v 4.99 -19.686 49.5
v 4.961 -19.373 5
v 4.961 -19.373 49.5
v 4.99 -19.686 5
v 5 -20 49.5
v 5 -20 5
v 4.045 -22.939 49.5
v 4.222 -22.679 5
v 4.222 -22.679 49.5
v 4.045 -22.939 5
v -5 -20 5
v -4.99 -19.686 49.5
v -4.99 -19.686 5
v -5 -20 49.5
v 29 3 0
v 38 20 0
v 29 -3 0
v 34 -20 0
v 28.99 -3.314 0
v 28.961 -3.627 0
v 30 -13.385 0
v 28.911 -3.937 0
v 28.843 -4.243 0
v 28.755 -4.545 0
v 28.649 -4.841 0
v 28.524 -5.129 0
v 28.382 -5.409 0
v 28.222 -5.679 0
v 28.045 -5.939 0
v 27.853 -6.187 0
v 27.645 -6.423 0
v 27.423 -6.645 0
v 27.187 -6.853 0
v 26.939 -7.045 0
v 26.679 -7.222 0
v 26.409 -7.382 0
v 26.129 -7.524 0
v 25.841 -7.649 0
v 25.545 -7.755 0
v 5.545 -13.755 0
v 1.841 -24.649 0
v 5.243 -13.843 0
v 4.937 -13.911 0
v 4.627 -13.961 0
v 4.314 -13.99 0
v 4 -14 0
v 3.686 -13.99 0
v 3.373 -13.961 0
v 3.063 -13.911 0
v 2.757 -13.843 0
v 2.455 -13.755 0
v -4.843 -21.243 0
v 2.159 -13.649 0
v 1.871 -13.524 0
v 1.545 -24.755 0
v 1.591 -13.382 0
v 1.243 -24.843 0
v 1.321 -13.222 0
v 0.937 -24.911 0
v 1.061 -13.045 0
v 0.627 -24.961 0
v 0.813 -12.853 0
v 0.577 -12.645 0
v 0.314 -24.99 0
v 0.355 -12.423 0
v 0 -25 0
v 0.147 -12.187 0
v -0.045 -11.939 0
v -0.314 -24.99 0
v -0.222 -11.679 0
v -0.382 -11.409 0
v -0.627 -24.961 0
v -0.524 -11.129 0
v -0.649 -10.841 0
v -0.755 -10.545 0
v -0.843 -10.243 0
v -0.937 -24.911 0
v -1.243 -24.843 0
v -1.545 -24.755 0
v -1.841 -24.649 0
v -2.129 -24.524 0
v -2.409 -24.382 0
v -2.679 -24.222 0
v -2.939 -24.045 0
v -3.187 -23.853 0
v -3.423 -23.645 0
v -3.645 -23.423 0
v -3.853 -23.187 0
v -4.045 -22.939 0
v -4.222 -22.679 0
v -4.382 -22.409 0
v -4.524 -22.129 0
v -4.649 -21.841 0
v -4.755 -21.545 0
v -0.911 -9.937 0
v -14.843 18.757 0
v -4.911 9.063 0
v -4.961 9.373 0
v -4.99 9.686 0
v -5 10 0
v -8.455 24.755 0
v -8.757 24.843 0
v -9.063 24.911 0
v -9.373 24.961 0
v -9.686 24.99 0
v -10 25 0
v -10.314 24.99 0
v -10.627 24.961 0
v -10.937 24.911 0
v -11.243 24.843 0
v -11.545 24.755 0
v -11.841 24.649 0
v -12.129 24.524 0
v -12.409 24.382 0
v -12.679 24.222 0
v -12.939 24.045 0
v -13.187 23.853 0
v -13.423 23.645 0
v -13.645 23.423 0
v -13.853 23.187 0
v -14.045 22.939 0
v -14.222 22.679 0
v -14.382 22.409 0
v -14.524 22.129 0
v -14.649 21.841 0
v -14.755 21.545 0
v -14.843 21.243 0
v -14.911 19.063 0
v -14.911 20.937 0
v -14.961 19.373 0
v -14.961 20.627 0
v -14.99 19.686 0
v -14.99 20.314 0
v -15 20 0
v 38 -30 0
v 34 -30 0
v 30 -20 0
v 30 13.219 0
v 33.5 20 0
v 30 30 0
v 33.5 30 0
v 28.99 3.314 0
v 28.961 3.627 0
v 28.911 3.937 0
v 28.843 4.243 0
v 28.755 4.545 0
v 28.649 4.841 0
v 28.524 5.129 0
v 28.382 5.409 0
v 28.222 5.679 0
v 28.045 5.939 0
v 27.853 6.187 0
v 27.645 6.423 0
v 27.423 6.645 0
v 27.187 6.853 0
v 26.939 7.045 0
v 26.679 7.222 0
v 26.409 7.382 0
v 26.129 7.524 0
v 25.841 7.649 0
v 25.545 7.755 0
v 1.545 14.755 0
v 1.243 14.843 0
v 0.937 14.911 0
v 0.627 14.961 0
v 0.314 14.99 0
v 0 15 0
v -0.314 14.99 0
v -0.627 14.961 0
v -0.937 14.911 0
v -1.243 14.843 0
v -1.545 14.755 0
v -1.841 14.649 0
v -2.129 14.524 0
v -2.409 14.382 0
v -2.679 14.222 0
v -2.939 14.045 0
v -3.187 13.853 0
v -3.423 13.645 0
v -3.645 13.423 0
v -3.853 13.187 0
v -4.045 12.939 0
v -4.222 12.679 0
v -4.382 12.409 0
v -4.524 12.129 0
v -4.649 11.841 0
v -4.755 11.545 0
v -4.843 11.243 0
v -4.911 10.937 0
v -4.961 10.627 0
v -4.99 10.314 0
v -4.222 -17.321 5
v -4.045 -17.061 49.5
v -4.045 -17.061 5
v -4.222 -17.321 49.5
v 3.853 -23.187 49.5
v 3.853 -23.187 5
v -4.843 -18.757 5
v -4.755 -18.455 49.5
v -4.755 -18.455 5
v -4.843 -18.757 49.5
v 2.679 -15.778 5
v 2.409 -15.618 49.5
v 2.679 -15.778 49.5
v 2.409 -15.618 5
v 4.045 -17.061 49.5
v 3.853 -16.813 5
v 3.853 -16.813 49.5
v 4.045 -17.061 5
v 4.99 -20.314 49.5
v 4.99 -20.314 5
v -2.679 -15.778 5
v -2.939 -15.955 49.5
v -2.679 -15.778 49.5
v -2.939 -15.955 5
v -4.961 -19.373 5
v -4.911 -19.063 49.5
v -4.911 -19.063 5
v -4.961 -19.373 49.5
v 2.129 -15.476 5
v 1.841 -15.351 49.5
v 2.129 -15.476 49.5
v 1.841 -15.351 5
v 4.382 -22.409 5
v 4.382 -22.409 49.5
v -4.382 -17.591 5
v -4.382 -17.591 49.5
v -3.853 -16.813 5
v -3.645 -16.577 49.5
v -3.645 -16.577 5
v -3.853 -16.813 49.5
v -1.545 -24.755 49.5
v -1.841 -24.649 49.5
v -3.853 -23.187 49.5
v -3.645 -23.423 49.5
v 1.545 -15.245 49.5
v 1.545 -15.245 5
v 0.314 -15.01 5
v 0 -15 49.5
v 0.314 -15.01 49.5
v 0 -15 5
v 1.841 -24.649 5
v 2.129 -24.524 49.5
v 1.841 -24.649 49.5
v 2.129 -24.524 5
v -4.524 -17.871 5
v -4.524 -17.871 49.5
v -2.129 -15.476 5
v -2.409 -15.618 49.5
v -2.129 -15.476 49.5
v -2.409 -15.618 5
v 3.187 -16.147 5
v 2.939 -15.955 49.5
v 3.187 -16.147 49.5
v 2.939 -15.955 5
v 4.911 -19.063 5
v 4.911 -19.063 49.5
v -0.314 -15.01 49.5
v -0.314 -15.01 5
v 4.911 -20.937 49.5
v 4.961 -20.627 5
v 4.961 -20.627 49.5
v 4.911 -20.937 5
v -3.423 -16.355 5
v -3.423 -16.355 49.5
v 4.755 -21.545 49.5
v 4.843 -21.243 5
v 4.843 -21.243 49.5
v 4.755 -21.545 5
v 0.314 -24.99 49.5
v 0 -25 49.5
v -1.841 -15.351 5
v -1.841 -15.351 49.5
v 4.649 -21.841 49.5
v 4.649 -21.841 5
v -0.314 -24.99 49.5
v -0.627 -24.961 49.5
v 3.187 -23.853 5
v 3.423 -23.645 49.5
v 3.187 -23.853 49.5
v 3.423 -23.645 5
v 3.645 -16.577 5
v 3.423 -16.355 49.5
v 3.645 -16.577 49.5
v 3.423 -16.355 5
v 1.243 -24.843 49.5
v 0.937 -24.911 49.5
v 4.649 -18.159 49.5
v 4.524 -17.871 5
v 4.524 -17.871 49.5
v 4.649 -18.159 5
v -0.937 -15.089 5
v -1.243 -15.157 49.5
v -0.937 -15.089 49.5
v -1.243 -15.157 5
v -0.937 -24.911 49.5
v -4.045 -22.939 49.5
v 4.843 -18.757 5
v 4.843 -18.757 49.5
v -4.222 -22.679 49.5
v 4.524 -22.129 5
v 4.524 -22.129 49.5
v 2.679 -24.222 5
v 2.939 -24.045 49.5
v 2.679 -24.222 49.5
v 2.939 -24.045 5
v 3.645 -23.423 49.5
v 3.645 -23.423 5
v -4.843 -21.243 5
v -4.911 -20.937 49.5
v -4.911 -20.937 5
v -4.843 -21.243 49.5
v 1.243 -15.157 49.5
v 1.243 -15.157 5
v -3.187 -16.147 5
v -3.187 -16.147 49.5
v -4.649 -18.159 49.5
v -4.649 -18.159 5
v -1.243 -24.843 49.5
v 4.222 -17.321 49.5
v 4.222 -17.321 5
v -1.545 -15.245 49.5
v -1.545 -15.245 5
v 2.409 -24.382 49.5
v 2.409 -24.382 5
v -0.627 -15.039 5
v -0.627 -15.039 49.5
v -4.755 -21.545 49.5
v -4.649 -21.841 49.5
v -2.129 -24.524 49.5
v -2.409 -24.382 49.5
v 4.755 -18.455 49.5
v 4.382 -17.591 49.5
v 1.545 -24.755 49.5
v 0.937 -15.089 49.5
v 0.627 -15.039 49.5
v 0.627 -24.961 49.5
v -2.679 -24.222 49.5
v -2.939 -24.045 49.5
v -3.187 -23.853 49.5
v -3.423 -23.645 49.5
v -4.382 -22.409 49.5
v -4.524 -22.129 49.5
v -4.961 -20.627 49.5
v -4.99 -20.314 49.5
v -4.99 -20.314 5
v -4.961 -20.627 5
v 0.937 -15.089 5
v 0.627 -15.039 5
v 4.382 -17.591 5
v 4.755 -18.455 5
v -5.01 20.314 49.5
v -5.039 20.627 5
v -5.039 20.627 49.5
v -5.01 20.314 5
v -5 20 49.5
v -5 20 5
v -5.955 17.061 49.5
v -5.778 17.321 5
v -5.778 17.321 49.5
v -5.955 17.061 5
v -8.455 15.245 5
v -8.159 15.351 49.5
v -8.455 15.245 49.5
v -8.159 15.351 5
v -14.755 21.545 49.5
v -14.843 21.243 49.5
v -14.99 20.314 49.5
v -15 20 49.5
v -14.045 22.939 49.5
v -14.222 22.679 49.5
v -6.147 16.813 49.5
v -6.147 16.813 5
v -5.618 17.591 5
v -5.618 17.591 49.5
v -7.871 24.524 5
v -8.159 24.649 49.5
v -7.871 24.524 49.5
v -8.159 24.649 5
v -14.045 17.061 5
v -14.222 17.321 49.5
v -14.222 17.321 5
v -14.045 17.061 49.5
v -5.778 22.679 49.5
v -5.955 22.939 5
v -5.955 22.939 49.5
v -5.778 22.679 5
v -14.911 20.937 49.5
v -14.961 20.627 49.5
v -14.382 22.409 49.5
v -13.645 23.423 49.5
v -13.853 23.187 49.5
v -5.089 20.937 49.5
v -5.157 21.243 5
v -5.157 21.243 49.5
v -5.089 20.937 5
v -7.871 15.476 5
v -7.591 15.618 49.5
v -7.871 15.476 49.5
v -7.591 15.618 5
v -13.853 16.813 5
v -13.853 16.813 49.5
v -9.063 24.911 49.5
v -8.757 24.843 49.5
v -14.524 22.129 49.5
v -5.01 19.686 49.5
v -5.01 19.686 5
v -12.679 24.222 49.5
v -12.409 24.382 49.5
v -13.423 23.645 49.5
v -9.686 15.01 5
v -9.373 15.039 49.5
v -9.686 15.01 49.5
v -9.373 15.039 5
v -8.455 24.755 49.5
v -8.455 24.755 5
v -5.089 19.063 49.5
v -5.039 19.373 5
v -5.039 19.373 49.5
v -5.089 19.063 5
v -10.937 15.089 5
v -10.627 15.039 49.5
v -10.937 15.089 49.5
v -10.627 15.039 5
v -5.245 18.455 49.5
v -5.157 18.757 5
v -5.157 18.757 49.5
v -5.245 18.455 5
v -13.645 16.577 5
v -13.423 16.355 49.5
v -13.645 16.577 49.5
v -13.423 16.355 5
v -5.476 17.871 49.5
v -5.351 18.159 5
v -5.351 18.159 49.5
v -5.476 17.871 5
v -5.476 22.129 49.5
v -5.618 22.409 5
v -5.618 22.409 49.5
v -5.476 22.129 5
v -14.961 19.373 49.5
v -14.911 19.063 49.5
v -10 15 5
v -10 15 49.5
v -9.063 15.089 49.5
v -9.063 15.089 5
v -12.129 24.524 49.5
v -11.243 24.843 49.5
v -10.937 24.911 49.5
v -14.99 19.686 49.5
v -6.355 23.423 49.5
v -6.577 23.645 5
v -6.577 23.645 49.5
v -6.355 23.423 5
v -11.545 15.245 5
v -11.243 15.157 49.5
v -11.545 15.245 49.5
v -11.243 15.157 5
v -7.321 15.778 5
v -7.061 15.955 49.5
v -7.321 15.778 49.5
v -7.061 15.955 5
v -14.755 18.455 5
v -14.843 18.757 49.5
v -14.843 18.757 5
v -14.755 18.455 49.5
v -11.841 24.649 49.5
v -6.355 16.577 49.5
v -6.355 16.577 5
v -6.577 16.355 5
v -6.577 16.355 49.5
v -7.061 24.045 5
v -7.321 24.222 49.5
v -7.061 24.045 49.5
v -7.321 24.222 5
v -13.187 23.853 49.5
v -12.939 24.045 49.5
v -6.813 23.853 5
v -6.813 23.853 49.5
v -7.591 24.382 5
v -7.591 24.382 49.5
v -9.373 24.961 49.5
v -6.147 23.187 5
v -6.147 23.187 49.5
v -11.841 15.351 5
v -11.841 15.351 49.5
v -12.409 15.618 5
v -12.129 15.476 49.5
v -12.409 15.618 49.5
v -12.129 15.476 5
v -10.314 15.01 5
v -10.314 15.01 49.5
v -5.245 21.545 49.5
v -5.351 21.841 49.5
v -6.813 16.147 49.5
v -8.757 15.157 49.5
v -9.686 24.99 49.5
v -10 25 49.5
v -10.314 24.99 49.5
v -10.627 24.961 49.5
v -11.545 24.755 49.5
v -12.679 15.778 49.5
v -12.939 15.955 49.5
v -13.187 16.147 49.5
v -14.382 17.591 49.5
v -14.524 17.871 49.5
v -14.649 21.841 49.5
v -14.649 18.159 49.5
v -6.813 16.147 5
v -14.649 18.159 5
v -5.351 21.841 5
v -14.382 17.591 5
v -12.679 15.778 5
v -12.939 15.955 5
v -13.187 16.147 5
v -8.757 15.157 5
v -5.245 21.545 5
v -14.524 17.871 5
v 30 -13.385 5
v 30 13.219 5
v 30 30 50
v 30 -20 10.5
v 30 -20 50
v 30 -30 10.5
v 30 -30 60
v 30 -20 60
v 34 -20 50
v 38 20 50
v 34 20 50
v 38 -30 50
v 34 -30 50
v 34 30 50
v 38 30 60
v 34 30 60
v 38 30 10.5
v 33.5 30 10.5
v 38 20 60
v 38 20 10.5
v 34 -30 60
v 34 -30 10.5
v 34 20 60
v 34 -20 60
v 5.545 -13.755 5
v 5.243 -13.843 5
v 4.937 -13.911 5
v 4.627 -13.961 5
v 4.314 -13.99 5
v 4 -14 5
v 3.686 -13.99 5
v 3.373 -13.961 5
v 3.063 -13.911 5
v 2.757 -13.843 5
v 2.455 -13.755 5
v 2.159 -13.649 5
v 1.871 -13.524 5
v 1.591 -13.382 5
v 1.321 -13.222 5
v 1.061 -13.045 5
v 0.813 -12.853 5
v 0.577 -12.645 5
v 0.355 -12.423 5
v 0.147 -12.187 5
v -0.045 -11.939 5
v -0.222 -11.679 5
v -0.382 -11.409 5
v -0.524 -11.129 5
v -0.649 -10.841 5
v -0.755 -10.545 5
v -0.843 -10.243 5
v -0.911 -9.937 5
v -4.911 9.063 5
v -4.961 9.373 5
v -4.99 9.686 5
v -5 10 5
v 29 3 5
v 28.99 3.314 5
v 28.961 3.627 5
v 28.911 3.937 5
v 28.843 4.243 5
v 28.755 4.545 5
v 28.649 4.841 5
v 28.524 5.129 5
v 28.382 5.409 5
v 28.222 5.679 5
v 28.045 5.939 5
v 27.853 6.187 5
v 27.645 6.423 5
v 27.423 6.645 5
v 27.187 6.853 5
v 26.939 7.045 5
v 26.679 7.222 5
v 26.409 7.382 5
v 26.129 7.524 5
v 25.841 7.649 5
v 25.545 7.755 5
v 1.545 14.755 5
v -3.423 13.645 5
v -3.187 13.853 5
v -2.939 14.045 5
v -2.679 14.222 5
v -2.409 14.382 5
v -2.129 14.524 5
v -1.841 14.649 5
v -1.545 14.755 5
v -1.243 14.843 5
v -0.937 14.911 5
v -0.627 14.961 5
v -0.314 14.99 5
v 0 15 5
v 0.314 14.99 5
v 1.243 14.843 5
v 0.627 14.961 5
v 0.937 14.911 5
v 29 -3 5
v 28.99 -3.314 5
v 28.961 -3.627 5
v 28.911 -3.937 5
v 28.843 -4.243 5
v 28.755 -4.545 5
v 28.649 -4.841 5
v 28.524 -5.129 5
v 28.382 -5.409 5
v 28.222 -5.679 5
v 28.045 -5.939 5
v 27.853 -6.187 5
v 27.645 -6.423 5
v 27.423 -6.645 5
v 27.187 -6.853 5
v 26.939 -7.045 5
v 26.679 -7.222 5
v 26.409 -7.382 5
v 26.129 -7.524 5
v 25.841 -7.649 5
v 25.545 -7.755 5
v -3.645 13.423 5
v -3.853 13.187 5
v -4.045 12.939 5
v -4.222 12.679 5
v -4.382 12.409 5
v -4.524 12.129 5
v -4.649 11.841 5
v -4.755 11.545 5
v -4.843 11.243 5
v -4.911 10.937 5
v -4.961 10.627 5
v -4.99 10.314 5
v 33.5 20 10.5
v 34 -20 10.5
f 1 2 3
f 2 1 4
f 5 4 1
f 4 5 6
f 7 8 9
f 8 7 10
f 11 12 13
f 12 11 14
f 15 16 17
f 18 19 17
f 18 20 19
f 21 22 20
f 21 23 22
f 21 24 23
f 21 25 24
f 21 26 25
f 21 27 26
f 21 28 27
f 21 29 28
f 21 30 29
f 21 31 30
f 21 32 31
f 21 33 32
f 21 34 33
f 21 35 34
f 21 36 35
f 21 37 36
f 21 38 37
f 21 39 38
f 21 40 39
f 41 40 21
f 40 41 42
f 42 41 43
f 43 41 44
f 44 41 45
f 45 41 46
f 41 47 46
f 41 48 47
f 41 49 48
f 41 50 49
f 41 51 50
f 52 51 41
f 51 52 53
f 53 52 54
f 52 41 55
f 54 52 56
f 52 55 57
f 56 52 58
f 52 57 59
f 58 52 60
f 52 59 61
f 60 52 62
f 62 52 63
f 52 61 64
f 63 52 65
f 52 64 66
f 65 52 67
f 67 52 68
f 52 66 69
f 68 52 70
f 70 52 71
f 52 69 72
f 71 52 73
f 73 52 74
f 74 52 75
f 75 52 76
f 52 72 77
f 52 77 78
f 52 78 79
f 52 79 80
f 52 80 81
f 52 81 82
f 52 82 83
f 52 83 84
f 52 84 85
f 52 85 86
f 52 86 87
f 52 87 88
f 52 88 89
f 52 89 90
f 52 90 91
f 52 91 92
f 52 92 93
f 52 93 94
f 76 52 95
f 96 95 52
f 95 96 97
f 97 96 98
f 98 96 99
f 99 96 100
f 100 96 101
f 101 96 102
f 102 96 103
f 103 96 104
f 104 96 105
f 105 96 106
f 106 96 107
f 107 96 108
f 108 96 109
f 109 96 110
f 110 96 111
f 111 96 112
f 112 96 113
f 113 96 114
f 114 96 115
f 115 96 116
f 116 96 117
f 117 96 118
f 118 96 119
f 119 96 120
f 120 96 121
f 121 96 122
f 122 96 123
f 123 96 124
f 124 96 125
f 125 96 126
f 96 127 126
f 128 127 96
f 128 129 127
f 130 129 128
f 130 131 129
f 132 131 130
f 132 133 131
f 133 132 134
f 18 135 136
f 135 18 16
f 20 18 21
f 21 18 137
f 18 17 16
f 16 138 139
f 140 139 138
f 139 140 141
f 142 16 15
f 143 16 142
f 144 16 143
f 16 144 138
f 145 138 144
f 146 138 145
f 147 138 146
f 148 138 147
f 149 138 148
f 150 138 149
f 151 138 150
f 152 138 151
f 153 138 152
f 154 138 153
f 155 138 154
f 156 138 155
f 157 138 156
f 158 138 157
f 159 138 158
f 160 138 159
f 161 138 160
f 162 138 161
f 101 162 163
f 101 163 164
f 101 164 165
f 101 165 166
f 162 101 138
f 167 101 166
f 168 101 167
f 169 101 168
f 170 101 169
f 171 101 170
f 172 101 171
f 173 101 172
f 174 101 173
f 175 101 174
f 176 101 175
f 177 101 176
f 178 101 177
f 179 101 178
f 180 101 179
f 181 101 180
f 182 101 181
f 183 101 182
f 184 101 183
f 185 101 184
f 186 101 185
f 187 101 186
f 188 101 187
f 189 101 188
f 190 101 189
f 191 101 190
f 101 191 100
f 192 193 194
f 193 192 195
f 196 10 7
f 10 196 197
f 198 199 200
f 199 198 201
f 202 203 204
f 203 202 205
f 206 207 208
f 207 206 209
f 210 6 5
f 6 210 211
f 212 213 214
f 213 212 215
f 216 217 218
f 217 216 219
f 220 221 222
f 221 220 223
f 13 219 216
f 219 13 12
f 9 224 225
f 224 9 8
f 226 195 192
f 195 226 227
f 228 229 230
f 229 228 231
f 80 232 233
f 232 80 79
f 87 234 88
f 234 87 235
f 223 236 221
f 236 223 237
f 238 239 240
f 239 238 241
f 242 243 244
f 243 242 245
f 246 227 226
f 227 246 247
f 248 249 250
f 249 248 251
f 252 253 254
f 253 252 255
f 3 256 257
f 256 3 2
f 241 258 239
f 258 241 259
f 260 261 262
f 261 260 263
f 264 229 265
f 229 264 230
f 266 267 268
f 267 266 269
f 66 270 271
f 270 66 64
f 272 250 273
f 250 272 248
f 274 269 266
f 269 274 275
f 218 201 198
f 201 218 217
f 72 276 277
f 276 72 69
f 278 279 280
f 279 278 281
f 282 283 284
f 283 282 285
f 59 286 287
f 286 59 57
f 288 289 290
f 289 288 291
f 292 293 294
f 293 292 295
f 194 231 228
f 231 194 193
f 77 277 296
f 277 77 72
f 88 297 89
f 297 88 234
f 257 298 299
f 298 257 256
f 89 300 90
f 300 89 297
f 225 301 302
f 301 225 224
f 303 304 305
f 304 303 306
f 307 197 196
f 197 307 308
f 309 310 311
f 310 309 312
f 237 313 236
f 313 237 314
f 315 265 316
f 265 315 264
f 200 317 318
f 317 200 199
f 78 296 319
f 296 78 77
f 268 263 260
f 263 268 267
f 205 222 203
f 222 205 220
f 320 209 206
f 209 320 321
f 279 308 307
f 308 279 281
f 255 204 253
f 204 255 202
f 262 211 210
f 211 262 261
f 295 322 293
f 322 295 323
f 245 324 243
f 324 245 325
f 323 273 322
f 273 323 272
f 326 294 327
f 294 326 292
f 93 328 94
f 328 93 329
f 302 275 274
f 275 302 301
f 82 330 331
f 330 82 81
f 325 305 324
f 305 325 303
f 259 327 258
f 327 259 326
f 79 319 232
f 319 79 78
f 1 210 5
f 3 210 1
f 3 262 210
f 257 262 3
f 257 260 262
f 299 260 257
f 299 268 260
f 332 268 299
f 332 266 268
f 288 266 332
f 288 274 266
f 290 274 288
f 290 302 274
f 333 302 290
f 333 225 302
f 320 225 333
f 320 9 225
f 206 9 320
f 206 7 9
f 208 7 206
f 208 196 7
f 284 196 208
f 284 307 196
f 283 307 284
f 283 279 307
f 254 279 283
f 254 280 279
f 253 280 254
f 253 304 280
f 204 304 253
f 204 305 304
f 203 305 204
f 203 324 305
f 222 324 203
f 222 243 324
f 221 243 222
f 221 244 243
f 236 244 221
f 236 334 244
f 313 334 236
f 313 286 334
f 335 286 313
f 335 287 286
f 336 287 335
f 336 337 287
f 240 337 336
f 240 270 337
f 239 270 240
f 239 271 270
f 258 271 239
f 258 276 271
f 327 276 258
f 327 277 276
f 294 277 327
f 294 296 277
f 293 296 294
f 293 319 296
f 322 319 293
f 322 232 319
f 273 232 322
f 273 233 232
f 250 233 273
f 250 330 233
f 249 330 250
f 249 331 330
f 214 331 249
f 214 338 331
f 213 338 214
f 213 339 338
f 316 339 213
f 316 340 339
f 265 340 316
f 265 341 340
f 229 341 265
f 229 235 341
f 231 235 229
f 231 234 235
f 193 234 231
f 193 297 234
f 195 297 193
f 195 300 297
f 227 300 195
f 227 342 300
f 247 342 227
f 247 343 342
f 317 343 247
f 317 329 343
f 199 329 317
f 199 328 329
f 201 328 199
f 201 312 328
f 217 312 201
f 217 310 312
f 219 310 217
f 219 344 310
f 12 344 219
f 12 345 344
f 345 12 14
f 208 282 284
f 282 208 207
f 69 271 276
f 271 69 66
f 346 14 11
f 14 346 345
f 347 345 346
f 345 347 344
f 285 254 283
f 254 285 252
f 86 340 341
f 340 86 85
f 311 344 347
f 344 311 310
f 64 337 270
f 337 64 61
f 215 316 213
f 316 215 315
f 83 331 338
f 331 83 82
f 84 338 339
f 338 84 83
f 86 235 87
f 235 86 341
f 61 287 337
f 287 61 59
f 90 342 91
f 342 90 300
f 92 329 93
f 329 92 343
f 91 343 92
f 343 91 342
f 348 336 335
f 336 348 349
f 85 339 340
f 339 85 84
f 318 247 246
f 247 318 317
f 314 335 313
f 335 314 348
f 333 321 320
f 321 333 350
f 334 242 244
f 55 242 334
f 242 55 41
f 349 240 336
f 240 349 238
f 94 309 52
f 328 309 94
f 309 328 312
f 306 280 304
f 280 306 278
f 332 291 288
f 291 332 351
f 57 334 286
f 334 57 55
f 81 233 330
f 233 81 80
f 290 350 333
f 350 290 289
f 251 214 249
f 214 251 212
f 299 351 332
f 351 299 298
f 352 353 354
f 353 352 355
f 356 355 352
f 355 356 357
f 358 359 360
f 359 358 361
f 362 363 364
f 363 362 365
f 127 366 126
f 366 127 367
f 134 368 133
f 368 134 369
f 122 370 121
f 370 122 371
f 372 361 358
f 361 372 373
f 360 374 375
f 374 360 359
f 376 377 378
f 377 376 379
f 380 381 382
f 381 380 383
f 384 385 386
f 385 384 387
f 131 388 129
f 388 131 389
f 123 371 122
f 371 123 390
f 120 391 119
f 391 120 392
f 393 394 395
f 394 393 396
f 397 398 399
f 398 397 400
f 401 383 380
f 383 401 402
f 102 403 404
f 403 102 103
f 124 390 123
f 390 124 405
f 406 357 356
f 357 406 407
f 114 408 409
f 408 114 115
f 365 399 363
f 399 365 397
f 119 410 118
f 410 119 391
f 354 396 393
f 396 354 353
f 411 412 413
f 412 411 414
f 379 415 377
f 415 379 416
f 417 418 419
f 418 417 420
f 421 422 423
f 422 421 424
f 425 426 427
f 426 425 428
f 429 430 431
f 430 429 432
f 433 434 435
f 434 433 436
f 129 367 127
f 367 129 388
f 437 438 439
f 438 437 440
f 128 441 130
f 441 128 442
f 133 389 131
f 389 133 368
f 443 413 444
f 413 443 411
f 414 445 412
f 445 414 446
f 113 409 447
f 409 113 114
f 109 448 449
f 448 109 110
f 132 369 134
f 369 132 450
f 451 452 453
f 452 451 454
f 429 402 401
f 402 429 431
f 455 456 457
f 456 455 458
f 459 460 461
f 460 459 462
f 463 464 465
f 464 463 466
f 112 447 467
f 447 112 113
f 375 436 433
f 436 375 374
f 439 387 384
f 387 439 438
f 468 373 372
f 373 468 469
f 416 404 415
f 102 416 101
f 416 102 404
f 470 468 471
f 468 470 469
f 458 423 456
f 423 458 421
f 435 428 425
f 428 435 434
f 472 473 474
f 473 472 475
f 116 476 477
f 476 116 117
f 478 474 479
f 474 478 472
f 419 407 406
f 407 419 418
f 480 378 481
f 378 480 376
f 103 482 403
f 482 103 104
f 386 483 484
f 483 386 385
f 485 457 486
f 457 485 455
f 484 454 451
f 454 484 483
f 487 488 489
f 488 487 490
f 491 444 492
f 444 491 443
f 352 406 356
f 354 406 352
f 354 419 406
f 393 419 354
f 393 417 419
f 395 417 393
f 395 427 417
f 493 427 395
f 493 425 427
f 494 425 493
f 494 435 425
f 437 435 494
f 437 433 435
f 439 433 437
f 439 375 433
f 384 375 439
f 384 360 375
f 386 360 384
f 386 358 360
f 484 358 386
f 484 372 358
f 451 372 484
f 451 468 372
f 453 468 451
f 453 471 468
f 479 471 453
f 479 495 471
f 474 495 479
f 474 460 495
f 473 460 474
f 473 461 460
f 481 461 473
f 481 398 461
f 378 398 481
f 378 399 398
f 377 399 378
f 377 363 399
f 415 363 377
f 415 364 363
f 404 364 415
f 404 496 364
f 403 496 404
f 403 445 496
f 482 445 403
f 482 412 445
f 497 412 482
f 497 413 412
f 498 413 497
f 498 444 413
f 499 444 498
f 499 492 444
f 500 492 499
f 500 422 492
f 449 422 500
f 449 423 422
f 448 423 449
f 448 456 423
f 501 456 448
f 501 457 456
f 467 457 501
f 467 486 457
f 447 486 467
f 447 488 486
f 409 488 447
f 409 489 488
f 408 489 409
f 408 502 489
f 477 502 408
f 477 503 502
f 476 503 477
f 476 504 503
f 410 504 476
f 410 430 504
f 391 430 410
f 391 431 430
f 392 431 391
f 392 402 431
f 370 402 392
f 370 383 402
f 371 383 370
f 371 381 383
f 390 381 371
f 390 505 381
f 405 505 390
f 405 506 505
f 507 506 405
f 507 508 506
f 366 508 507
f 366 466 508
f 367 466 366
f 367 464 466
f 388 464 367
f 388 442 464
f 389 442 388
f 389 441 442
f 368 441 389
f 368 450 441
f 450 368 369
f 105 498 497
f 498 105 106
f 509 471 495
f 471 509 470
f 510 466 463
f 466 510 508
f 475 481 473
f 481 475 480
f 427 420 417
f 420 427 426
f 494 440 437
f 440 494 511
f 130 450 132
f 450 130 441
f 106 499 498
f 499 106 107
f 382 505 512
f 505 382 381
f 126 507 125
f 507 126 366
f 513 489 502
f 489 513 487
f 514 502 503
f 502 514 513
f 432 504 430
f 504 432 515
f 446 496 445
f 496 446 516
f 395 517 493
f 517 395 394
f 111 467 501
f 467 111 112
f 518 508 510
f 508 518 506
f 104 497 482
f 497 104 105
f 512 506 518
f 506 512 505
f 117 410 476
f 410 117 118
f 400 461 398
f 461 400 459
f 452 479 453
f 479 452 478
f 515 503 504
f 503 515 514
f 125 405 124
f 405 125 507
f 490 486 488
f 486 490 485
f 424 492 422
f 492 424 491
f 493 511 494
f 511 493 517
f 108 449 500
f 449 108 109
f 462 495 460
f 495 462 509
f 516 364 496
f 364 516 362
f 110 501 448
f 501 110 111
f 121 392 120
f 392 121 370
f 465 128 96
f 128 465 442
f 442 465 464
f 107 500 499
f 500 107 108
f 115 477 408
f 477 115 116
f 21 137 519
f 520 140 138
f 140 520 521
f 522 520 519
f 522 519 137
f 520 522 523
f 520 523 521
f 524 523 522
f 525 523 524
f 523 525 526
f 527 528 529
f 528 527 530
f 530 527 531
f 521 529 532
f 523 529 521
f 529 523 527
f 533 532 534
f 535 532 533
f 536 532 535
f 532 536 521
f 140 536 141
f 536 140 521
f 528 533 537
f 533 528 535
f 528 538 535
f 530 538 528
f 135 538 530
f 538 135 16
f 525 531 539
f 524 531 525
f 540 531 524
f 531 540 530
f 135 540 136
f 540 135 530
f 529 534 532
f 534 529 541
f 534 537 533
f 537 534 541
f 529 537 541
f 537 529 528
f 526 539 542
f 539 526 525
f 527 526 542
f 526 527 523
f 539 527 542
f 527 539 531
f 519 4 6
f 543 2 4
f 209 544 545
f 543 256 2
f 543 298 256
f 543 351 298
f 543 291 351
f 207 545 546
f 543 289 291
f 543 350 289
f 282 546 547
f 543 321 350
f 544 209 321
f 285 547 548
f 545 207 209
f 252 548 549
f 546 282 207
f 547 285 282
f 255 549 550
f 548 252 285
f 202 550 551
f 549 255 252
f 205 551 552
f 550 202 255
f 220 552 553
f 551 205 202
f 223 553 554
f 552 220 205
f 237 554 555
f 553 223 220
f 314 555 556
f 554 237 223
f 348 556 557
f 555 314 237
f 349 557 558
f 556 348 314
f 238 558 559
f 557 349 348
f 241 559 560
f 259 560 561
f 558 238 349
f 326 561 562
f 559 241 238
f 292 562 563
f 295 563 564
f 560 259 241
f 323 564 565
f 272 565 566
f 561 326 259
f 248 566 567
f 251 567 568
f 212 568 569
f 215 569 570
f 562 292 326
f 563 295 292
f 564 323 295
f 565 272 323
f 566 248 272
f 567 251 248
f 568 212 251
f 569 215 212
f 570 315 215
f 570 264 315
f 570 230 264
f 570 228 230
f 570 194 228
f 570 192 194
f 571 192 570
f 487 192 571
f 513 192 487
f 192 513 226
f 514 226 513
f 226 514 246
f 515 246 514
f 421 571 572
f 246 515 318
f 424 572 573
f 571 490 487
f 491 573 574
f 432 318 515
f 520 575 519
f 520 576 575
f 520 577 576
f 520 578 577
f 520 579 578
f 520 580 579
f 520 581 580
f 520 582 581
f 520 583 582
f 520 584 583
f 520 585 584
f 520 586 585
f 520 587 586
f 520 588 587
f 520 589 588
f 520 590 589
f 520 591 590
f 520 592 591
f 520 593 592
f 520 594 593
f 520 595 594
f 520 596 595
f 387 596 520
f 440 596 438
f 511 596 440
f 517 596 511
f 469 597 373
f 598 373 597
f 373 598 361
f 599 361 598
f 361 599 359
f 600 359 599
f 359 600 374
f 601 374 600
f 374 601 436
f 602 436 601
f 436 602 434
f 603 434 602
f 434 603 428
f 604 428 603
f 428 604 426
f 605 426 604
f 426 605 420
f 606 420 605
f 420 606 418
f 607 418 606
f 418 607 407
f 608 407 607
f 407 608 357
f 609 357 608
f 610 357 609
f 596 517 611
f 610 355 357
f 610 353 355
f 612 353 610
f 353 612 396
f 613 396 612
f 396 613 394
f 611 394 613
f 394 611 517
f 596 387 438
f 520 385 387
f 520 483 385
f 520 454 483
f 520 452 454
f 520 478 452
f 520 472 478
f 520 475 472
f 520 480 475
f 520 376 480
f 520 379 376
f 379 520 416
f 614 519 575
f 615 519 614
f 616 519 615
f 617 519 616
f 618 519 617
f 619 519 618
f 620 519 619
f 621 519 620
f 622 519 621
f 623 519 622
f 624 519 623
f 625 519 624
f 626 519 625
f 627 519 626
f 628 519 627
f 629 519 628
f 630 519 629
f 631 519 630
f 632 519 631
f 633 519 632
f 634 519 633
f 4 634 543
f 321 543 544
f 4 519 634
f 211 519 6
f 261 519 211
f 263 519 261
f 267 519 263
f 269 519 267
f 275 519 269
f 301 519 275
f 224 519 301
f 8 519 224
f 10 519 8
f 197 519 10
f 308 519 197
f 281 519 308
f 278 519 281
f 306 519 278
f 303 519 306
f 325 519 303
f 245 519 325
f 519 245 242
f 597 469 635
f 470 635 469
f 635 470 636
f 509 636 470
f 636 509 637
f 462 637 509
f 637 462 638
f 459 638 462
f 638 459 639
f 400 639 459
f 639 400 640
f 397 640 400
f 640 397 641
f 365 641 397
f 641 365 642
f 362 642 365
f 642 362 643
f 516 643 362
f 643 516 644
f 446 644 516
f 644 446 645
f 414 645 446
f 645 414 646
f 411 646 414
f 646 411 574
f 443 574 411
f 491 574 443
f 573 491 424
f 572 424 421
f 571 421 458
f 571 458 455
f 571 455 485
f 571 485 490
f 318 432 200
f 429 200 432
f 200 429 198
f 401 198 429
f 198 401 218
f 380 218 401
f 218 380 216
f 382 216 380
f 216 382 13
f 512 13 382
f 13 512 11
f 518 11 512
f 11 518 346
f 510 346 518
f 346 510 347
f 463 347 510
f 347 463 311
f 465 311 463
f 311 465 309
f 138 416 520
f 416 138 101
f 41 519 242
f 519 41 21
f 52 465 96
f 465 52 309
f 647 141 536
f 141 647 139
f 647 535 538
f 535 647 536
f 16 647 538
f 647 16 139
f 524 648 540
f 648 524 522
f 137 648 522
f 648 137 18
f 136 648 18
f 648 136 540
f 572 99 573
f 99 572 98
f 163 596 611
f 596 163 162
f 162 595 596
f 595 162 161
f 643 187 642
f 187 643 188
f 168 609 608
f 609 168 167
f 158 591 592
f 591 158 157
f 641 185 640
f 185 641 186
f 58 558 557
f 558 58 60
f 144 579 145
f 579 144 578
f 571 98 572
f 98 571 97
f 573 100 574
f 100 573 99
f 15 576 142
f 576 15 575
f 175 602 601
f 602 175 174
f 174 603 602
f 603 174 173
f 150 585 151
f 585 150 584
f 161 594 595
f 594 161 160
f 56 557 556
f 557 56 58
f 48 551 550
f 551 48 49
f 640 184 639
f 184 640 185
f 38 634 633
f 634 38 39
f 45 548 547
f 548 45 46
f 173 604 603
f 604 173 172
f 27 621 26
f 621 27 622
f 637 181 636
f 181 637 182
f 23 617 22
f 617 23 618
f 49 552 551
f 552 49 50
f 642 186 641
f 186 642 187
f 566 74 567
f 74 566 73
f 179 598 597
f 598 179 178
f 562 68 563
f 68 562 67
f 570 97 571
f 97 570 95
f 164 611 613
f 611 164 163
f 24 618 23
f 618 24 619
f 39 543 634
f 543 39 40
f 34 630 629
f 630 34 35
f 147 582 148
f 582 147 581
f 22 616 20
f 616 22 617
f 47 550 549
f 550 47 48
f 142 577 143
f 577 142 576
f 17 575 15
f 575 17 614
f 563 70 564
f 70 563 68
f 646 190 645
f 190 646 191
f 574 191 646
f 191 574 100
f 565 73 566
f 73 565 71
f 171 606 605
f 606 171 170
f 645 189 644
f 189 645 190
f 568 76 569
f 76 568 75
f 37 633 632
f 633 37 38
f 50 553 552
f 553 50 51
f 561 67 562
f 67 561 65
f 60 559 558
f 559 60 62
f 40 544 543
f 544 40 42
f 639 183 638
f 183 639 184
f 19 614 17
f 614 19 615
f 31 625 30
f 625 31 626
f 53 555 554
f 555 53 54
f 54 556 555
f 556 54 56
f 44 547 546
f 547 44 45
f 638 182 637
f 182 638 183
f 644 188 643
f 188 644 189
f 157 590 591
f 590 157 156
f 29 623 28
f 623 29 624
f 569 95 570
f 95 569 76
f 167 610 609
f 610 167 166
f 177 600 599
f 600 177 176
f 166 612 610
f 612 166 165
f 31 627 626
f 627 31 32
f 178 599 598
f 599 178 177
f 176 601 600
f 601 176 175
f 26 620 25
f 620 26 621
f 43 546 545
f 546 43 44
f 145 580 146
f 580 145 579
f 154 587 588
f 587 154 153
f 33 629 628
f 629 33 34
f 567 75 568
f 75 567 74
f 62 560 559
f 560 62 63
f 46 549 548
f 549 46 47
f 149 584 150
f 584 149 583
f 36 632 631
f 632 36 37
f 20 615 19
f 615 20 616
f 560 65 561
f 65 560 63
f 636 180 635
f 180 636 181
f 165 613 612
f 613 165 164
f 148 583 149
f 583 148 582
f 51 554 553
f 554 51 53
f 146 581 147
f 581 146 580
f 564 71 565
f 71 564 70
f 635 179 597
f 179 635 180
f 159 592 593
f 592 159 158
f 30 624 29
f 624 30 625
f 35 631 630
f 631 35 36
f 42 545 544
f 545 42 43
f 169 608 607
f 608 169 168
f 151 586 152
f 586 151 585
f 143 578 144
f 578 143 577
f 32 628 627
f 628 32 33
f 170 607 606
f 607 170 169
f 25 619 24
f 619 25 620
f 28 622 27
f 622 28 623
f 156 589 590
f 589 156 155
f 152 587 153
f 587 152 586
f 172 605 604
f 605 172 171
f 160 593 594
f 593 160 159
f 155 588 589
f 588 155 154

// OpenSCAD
difference() {
    union() {
        translate([0,-20,0]) linear_extrude(49.5) circle(5,$fn=100);
        translate([-10,20,0]) linear_extrude(49.5) circle(5,$fn=100);
        translate([30,-30,0]) linear_extrude(50)  square([8,60]);
        translate([34,20,50]) linear_extrude(10) square([4,10]);
        translate([30,-30,50]) linear_extrude(10) square([4,10]);
        linear_extrude(5) hull() {
            translate([0,-20,0]) circle(5,$fn=100);
            translate([-10,20,0]) circle(5,$fn=100);
            translate([30,8,0]) circle(5,$fn=100);
            translate([30,-8,0]) circle(5,$fn=100);
        }
    }
    translate([33.5,20,0]) linear_extrude(10.5) square([4.5,10]);
    translate([29.5,-30,0]) linear_extrude(10.5) square([4.5,10]);
    linear_extrude(10) hull() {       
        translate([4,-9,0]) circle(5,$fn=100);
        translate([0,10,0]) circle(5,$fn=100);
        translate([24,-3,0]) circle(5,$fn=100);
        translate([24,3,0]) circle(5,$fn=100);
    }        
}
